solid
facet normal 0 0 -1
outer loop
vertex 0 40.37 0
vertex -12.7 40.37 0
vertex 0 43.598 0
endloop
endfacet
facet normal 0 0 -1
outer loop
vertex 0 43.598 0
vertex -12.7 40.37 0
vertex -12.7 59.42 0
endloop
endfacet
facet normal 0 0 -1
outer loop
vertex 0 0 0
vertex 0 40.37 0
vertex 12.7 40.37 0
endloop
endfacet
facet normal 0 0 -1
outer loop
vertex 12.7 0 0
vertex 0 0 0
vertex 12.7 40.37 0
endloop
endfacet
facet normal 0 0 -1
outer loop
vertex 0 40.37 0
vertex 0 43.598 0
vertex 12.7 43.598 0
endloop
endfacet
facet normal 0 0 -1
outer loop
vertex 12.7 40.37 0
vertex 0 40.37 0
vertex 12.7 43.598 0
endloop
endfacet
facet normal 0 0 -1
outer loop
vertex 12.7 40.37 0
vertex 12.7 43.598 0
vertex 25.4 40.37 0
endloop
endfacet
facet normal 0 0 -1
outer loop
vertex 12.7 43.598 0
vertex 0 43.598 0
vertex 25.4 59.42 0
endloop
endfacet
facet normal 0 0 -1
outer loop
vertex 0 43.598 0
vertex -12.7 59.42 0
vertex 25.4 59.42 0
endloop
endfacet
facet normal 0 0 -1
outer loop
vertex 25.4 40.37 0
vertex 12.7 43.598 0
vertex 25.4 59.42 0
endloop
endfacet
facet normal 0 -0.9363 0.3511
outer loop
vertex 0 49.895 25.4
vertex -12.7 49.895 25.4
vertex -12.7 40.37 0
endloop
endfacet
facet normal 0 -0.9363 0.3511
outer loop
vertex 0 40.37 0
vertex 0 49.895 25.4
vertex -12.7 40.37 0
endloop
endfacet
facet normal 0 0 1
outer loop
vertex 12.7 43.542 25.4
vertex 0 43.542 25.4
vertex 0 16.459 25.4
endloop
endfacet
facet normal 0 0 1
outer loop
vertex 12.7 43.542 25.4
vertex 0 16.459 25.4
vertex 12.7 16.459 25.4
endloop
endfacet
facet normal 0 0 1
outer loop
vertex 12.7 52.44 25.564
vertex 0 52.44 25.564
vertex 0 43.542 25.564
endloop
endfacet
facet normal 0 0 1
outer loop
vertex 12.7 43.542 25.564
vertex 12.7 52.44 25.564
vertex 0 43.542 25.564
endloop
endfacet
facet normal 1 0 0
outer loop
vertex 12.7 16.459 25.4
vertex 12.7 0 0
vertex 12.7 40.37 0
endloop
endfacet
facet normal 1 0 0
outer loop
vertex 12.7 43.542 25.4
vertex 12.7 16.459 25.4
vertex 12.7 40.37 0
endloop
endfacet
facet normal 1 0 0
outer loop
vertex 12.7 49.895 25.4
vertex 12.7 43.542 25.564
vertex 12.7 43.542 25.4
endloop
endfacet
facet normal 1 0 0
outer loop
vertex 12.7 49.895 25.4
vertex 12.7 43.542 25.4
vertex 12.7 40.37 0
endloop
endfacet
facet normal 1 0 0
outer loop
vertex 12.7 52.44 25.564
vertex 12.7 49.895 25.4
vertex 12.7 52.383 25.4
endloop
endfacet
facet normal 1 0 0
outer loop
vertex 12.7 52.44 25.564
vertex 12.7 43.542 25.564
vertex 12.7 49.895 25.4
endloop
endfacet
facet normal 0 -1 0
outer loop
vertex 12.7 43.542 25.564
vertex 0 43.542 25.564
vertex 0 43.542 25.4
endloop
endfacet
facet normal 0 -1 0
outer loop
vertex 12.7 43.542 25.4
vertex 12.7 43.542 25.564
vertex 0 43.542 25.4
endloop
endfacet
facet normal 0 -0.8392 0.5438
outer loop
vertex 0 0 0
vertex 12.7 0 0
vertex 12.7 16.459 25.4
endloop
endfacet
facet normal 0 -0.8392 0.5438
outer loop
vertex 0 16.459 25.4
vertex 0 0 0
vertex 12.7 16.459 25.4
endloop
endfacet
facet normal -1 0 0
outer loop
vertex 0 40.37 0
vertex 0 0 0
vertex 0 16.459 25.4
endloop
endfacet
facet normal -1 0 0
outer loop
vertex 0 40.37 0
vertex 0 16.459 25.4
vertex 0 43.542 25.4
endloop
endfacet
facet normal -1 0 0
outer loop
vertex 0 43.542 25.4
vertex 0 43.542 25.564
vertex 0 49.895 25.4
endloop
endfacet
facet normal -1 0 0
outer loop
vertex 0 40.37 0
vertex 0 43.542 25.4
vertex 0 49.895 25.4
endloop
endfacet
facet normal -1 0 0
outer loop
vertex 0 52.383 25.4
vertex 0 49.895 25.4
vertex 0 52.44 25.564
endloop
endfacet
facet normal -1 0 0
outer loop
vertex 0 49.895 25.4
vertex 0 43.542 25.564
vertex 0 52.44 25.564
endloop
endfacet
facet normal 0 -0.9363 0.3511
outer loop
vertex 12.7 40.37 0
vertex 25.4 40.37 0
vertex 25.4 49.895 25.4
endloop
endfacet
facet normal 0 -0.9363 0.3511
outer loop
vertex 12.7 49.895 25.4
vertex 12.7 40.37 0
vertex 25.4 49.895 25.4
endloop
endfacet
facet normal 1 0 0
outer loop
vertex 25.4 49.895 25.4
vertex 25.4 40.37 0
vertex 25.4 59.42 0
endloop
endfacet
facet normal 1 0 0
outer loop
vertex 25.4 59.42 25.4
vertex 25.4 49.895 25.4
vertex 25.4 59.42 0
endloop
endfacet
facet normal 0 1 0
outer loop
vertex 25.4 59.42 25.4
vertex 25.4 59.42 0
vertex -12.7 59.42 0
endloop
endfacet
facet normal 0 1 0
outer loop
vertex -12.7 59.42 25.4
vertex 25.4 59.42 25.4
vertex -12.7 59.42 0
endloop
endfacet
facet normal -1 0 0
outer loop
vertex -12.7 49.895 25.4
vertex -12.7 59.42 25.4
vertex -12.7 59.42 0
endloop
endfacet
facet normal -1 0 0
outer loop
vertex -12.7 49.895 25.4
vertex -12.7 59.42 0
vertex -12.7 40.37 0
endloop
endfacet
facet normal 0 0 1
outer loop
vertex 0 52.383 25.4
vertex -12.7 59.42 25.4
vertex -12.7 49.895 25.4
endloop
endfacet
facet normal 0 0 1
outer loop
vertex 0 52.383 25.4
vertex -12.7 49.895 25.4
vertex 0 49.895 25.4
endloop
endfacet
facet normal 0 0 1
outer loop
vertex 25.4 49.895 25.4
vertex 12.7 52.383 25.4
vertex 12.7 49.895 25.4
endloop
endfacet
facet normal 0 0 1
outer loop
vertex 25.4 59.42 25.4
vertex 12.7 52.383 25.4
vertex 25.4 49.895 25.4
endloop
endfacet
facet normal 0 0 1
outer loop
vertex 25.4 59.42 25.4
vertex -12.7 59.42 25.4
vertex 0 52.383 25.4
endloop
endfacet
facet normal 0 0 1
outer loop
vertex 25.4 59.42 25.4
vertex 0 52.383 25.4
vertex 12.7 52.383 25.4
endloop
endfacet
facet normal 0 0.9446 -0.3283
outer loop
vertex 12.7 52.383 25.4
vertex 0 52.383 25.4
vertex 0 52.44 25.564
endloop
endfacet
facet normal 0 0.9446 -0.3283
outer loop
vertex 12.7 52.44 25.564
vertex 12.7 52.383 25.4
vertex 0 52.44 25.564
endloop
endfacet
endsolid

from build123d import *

# Parameters (mm, degrees)
F1_DEPTH  = 25.4
F1_FACE_W = 40.370063592
F1_FACE_H = 25.4
F3_DEPTH  = 12.7
F5_DEPTH  = 25.4
F7_DEPTH  = 12.7
F9_DEPTH  = 12.7
F11_DEPTH = 12.7


with BuildPart() as f1:
    # F0 (on Top) → F1 (new body)
    with BuildSketch(Plane.XY):
        Polygon((0, 40.370063592), (0, 0), (12.7, 0), (12.7, 40.370063592), (25.4, 40.370063592), (25.4, 59.420063592), (-12.7, 59.420063592), (-12.7, 40.370063592), align=None)
    extrude(amount=F1_DEPTH)

    # F2 (on Right) + F1_face (on face) → F3 (cut)
    with BuildSketch(Plane.YZ):
        Polygon((8.6346566677, 25.5012921989), (0, 0), (13.8414995745, 0), (21.3624928147, 25.5012921989), align=None)
    with BuildSketch(Plane(origin=(0, 20.185031796, 12.7), x_dir=(0, -1, 0), z_dir=(-1, 0, 0))):
        Rectangle(F1_FACE_W, F1_FACE_H)
    extrude(amount=-F3_DEPTH, dir=(1, 0, 0), mode=Mode.SUBTRACT)

    # F4 (on face) → F5 (cut)
    with BuildSketch(Plane.YZ.offset(12.7)):
        Polygon((0, 0), (16.459165141, 25.4), (0, 25.4), align=None)
    extrude(amount=-F5_DEPTH, mode=Mode.SUBTRACT)

    # F6 (on face) → F7 (cut)
    with BuildSketch(Plane(origin=(-12.7, 0, 0), x_dir=(0, -1, 0), z_dir=(-1, 0, 0))):
        Polygon((-40.370063592, 25.4), (-49.895063592, 25.4), (-40.370063592, 0), align=None)
    extrude(amount=-F7_DEPTH, mode=Mode.SUBTRACT)

    # F8 (on Right) → F9 (join)
    with BuildSketch(Plane.YZ):
        Polygon((43.5419380665, 25.5644246936), (43.5981824994, 0), (52.4402596056, 25.5644246936), align=None)
    extrude(amount=F9_DEPTH)

    # F10 (on face) → F11 (cut)
    with BuildSketch(Plane.YZ.offset(25.4)):
        Polygon((40.370063592, 25.4), (40.370063592, 0), (49.895063592, 25.4), align=None)
    extrude(amount=-F11_DEPTH, mode=Mode.SUBTRACT)


solid = f1.part
